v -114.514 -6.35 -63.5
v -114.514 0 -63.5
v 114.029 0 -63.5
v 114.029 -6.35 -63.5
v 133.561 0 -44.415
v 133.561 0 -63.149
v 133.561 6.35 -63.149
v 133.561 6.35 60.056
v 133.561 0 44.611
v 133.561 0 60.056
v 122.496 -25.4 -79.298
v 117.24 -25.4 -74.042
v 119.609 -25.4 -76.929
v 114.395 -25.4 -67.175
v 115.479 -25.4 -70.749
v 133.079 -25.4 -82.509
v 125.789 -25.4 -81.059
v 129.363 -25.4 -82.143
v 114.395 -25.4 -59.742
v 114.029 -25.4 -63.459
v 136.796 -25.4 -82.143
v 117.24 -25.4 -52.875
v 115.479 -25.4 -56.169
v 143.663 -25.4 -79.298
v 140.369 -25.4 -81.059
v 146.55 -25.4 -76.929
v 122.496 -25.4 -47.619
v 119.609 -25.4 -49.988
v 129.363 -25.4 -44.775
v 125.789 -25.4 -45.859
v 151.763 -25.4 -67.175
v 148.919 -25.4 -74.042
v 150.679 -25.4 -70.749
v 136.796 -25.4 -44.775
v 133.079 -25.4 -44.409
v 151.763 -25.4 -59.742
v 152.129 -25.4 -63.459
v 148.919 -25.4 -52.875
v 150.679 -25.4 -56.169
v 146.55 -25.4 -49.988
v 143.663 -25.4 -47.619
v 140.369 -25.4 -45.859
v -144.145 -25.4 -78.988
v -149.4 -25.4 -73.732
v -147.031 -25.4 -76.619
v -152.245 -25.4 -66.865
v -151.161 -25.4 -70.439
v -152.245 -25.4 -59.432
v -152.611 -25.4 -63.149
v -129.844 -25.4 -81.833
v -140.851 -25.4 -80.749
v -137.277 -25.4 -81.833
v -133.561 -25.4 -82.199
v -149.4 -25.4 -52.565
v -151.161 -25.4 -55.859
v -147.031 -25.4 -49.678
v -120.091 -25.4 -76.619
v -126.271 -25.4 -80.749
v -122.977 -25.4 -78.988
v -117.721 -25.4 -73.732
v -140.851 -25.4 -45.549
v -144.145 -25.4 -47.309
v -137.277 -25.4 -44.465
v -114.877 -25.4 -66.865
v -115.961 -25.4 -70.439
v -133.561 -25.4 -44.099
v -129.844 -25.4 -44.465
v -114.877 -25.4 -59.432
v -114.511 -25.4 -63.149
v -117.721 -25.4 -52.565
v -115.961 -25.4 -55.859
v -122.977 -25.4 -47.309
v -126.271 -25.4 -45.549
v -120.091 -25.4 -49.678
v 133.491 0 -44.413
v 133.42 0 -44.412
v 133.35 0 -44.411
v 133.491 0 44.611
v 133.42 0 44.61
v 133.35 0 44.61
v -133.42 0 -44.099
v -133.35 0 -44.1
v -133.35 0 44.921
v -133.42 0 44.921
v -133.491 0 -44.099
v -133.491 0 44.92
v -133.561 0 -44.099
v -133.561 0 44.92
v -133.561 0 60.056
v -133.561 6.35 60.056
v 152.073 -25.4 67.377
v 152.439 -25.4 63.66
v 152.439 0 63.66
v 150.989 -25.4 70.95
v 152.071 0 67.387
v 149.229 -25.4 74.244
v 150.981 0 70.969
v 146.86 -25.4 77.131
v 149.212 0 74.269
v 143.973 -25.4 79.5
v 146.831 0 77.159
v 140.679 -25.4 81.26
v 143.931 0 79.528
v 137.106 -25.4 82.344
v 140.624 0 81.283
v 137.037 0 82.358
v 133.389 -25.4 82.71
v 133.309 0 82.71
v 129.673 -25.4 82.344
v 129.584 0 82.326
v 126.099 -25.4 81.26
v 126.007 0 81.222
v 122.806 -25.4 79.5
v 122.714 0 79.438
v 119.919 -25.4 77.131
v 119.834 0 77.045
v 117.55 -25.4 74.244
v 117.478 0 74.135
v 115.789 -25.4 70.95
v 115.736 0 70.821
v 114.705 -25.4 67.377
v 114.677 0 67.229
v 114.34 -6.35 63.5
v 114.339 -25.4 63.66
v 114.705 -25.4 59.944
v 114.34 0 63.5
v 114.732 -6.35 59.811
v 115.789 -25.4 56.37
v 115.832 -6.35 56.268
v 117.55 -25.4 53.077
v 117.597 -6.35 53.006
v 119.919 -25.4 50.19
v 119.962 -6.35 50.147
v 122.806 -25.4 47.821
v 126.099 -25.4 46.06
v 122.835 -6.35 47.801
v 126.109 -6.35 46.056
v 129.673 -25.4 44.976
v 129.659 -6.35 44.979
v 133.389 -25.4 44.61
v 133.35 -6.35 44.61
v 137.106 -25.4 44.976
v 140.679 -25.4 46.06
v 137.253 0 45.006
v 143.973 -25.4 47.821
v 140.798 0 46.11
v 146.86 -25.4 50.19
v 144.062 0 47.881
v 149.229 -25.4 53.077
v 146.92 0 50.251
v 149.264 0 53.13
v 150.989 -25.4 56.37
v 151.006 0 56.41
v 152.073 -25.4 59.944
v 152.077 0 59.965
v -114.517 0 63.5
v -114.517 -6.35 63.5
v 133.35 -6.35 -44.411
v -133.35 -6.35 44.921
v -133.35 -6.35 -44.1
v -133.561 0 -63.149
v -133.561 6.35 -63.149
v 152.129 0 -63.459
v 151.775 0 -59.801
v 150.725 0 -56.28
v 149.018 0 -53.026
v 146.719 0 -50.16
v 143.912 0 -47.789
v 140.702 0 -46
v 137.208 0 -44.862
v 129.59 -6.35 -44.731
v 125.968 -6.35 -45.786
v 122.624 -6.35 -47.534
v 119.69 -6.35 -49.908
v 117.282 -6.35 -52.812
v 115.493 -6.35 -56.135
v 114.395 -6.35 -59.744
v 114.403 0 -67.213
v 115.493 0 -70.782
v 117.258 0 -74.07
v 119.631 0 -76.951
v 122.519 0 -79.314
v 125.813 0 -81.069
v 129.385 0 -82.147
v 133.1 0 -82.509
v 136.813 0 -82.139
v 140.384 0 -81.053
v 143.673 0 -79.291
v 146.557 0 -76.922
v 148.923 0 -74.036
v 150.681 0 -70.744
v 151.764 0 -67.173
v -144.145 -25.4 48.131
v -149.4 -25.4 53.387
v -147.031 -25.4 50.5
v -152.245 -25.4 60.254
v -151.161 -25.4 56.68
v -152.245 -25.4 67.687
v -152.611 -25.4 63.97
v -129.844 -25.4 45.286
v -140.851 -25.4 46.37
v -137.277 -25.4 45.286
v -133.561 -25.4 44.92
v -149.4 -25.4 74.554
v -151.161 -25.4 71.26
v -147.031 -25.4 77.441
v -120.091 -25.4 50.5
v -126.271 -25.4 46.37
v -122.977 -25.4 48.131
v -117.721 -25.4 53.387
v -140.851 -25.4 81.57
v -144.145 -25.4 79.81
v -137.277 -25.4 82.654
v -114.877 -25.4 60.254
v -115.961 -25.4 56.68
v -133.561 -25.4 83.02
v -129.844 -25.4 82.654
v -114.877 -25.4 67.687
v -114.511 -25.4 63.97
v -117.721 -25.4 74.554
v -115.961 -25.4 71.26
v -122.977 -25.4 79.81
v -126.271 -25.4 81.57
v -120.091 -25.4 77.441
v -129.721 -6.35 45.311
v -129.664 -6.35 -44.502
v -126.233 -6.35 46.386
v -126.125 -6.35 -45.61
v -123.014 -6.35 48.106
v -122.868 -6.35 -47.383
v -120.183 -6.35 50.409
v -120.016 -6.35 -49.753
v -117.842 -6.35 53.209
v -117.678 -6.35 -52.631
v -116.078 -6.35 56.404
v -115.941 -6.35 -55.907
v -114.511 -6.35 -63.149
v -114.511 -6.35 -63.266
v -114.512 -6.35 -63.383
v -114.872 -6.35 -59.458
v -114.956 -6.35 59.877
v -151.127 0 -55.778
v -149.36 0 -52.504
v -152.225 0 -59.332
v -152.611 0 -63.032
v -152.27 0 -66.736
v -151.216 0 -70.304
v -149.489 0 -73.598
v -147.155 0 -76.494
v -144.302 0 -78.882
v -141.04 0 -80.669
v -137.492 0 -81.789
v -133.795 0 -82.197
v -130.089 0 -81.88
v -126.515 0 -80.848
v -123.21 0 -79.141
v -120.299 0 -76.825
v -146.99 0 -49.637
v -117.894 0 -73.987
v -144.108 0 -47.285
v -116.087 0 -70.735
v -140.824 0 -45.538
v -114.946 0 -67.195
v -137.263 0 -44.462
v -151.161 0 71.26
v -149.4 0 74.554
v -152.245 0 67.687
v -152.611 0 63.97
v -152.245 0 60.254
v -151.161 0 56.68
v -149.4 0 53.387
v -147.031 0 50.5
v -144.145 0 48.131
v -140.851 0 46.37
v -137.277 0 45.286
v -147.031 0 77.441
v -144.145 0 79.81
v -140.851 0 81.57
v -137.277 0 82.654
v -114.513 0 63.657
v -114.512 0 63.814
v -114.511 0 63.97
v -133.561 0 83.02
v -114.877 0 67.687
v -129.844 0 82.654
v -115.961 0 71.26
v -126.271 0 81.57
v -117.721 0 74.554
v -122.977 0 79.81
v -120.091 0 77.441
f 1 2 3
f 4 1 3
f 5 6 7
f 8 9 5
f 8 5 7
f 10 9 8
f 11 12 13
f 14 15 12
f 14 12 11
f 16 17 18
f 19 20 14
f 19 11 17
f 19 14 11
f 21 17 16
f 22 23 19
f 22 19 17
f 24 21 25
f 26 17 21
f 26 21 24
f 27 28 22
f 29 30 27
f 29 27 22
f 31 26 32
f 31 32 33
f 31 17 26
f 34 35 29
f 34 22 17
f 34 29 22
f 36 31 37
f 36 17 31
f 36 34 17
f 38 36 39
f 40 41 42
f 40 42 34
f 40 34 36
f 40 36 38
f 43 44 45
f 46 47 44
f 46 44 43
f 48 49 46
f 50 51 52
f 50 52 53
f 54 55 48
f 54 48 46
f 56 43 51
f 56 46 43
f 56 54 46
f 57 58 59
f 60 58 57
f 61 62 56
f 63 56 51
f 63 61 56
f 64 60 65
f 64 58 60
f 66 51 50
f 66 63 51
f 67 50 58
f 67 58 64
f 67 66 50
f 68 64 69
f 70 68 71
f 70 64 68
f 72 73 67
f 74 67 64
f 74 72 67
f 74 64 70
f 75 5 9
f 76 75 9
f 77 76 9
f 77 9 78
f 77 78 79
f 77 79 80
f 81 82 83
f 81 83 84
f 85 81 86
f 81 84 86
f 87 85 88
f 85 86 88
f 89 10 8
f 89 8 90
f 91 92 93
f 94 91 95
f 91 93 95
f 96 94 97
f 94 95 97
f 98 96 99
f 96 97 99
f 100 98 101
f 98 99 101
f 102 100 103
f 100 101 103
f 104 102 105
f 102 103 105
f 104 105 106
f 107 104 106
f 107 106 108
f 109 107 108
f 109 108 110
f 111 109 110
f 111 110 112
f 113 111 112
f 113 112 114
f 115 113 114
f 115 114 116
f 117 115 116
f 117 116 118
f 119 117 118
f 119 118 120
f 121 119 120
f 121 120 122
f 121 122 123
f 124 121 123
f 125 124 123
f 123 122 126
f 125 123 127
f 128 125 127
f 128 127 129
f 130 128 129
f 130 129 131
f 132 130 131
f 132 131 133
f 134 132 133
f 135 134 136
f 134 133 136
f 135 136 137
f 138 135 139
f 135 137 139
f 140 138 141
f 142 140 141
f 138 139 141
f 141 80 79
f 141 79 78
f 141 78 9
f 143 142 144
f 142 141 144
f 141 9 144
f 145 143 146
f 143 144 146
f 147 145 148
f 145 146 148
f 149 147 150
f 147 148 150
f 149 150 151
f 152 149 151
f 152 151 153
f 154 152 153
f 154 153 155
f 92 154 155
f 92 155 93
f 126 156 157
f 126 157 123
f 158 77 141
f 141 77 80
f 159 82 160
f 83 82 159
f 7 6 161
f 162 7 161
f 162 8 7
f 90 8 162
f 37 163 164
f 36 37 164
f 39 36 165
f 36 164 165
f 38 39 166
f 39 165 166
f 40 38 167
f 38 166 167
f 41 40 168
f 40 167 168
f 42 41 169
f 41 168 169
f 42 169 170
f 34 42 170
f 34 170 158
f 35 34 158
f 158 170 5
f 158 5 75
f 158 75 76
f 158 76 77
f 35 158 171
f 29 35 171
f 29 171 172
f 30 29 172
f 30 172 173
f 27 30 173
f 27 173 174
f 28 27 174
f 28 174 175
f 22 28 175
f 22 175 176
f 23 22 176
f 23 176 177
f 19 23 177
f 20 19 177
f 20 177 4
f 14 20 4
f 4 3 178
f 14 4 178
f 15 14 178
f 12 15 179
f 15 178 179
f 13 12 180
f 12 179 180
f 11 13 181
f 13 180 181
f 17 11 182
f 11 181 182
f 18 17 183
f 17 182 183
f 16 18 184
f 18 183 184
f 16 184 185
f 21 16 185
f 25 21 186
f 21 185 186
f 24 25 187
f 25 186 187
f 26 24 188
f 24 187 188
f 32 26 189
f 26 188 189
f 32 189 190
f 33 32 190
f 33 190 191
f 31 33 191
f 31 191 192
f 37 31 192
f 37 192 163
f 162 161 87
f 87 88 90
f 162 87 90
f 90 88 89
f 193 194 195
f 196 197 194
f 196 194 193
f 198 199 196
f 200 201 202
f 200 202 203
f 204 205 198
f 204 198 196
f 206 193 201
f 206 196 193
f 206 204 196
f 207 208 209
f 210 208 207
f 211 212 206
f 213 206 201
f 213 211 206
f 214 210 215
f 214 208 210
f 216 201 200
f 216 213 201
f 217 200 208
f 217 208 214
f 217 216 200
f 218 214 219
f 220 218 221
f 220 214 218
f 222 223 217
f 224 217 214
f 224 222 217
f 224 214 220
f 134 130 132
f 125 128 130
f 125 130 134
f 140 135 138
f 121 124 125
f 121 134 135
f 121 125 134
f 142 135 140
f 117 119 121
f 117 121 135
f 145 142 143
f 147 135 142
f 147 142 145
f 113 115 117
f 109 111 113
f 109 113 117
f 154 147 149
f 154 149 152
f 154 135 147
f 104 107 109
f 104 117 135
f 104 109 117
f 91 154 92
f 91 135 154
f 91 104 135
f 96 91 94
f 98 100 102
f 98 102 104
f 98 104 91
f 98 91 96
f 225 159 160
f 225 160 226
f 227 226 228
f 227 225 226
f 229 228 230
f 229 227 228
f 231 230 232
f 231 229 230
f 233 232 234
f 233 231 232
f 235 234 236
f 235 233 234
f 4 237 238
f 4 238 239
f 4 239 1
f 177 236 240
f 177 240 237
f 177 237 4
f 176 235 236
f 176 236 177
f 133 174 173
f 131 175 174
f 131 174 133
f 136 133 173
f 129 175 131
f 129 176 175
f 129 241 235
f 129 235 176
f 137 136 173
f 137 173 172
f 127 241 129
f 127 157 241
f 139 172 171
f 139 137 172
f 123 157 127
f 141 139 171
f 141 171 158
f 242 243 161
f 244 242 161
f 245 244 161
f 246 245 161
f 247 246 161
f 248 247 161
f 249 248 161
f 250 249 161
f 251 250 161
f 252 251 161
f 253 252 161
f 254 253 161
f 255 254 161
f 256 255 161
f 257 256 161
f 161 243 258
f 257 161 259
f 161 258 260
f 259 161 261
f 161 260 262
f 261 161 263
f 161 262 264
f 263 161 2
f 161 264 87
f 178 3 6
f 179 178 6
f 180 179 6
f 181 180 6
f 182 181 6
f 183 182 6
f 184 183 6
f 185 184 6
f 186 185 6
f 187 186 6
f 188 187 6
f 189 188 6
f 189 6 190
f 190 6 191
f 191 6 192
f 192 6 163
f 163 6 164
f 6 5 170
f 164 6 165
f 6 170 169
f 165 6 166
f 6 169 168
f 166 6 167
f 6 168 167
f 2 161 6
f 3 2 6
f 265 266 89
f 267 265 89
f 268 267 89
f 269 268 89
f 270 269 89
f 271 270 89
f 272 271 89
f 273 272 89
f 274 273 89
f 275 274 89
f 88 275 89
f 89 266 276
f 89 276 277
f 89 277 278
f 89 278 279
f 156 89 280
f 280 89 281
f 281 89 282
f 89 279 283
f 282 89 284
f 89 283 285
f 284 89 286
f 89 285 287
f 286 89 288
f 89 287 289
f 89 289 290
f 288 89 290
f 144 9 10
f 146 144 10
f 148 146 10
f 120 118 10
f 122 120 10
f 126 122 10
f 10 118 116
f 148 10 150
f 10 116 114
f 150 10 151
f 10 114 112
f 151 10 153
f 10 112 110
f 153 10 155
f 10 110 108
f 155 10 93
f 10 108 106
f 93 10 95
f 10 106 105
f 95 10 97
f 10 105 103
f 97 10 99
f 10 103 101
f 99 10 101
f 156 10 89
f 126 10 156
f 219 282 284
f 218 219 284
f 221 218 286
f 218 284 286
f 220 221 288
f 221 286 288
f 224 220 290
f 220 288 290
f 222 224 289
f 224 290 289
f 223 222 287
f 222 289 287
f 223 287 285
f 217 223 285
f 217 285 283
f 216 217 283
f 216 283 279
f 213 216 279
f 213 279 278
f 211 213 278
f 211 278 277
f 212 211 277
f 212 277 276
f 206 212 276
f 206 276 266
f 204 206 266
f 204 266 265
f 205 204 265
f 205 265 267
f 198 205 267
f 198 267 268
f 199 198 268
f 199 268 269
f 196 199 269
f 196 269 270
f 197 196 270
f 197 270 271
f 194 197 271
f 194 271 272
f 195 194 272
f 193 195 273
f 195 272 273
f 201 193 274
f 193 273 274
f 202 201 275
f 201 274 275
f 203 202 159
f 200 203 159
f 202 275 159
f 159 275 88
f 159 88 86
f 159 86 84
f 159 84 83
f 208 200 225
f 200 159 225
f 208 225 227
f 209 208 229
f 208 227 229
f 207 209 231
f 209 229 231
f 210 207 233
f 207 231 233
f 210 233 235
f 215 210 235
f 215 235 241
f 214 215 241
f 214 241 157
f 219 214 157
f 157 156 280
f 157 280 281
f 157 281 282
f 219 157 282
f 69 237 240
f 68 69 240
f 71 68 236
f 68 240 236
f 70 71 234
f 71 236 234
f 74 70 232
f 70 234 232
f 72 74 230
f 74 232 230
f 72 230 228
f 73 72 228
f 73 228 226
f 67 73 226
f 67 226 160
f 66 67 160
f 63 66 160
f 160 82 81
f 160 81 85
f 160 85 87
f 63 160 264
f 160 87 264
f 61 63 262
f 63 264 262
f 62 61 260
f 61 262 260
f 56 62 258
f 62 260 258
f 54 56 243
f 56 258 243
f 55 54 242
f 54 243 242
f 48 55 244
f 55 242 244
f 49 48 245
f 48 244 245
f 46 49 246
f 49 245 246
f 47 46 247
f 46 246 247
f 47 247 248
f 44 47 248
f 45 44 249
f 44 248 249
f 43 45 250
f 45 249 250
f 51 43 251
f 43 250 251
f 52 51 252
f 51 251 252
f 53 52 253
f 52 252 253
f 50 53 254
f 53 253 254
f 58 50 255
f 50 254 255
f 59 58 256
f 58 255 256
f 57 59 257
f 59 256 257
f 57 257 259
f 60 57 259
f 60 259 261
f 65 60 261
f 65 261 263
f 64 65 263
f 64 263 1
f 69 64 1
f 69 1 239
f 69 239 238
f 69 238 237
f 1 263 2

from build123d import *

# Parameters (mm, degrees)
F0_W     = 266.7
F0_H     = 127
F0_W_2   = 228.6
F0_H_2   = 12.7
F2_DEPTH = 6.35
F1_R     = 19.05
F3_DEPTH = 25.4
F4_W     = 267.121822
F4_H     = 123.204811
F5_DEPTH = 6.35


with BuildPart() as f2:
    # F0 (on Front) → F2 (new body)
    with BuildSketch(Plane.XZ):
        Rectangle(F0_W, F0_H)
        Polygon((114.3, -38.1), (114.3, -50.8), (-114.3, -50.8), (-114.3, -38.1), (-114.3, -25.4), (-114.3, -12.7), (-114.3, 0), (-114.3, 12.7), (-114.3, 25.4), (-114.3, 38.1), (-114.3, 50.8), (114.3, 50.8), (114.3, 38.1), (114.3, 25.4), (114.3, 12.7), (114.3, 0), (114.3, -12.7), (114.3, -25.4), align=None, mode=Mode.SUBTRACT)
        with Locations((0, -44.45)):
            Rectangle(F0_W_2, F0_H_2)
        with Locations((0, -31.75)):
            Rectangle(F0_W_2, F0_H_2)
        with Locations((0, -19.05)):
            Rectangle(F0_W_2, F0_H_2)
        with Locations((0, -6.35)):
            Rectangle(F0_W_2, F0_H_2)
        with Locations((0, 6.35)):
            Rectangle(F0_W_2, F0_H_2)
        with Locations((0, 19.05)):
            Rectangle(F0_W_2, F0_H_2)
        with Locations((0, 31.75)):
            Rectangle(F0_W_2, F0_H_2)
        with Locations((0, 44.45)):
            Rectangle(F0_W_2, F0_H_2)
    extrude(amount=F2_DEPTH)

    # F1 (on face) → F3 (join)
    with BuildSketch(Plane.XZ):
        with Locations((-133.560911, 63.970305)):
            Circle(F1_R)
        with Locations((133.389249, 63.660257)):
            Circle(F1_R)
        with Locations((133.079201, -63.458867)):
            Circle(F1_R)
        with Locations((-133.560911, -63.148819)):
            Circle(F1_R)
    extrude(amount=F3_DEPTH)

    # F4 (on face) → F5 (join)
    with BuildSketch(Plane(origin=(0, 0, 0), x_dir=(-1, 0, 0), z_dir=(0, 1, 0))):
        with Locations((0, -1.546413)):
            Rectangle(F4_W, F4_H)
    extrude(amount=F5_DEPTH)


solid = f2.part
